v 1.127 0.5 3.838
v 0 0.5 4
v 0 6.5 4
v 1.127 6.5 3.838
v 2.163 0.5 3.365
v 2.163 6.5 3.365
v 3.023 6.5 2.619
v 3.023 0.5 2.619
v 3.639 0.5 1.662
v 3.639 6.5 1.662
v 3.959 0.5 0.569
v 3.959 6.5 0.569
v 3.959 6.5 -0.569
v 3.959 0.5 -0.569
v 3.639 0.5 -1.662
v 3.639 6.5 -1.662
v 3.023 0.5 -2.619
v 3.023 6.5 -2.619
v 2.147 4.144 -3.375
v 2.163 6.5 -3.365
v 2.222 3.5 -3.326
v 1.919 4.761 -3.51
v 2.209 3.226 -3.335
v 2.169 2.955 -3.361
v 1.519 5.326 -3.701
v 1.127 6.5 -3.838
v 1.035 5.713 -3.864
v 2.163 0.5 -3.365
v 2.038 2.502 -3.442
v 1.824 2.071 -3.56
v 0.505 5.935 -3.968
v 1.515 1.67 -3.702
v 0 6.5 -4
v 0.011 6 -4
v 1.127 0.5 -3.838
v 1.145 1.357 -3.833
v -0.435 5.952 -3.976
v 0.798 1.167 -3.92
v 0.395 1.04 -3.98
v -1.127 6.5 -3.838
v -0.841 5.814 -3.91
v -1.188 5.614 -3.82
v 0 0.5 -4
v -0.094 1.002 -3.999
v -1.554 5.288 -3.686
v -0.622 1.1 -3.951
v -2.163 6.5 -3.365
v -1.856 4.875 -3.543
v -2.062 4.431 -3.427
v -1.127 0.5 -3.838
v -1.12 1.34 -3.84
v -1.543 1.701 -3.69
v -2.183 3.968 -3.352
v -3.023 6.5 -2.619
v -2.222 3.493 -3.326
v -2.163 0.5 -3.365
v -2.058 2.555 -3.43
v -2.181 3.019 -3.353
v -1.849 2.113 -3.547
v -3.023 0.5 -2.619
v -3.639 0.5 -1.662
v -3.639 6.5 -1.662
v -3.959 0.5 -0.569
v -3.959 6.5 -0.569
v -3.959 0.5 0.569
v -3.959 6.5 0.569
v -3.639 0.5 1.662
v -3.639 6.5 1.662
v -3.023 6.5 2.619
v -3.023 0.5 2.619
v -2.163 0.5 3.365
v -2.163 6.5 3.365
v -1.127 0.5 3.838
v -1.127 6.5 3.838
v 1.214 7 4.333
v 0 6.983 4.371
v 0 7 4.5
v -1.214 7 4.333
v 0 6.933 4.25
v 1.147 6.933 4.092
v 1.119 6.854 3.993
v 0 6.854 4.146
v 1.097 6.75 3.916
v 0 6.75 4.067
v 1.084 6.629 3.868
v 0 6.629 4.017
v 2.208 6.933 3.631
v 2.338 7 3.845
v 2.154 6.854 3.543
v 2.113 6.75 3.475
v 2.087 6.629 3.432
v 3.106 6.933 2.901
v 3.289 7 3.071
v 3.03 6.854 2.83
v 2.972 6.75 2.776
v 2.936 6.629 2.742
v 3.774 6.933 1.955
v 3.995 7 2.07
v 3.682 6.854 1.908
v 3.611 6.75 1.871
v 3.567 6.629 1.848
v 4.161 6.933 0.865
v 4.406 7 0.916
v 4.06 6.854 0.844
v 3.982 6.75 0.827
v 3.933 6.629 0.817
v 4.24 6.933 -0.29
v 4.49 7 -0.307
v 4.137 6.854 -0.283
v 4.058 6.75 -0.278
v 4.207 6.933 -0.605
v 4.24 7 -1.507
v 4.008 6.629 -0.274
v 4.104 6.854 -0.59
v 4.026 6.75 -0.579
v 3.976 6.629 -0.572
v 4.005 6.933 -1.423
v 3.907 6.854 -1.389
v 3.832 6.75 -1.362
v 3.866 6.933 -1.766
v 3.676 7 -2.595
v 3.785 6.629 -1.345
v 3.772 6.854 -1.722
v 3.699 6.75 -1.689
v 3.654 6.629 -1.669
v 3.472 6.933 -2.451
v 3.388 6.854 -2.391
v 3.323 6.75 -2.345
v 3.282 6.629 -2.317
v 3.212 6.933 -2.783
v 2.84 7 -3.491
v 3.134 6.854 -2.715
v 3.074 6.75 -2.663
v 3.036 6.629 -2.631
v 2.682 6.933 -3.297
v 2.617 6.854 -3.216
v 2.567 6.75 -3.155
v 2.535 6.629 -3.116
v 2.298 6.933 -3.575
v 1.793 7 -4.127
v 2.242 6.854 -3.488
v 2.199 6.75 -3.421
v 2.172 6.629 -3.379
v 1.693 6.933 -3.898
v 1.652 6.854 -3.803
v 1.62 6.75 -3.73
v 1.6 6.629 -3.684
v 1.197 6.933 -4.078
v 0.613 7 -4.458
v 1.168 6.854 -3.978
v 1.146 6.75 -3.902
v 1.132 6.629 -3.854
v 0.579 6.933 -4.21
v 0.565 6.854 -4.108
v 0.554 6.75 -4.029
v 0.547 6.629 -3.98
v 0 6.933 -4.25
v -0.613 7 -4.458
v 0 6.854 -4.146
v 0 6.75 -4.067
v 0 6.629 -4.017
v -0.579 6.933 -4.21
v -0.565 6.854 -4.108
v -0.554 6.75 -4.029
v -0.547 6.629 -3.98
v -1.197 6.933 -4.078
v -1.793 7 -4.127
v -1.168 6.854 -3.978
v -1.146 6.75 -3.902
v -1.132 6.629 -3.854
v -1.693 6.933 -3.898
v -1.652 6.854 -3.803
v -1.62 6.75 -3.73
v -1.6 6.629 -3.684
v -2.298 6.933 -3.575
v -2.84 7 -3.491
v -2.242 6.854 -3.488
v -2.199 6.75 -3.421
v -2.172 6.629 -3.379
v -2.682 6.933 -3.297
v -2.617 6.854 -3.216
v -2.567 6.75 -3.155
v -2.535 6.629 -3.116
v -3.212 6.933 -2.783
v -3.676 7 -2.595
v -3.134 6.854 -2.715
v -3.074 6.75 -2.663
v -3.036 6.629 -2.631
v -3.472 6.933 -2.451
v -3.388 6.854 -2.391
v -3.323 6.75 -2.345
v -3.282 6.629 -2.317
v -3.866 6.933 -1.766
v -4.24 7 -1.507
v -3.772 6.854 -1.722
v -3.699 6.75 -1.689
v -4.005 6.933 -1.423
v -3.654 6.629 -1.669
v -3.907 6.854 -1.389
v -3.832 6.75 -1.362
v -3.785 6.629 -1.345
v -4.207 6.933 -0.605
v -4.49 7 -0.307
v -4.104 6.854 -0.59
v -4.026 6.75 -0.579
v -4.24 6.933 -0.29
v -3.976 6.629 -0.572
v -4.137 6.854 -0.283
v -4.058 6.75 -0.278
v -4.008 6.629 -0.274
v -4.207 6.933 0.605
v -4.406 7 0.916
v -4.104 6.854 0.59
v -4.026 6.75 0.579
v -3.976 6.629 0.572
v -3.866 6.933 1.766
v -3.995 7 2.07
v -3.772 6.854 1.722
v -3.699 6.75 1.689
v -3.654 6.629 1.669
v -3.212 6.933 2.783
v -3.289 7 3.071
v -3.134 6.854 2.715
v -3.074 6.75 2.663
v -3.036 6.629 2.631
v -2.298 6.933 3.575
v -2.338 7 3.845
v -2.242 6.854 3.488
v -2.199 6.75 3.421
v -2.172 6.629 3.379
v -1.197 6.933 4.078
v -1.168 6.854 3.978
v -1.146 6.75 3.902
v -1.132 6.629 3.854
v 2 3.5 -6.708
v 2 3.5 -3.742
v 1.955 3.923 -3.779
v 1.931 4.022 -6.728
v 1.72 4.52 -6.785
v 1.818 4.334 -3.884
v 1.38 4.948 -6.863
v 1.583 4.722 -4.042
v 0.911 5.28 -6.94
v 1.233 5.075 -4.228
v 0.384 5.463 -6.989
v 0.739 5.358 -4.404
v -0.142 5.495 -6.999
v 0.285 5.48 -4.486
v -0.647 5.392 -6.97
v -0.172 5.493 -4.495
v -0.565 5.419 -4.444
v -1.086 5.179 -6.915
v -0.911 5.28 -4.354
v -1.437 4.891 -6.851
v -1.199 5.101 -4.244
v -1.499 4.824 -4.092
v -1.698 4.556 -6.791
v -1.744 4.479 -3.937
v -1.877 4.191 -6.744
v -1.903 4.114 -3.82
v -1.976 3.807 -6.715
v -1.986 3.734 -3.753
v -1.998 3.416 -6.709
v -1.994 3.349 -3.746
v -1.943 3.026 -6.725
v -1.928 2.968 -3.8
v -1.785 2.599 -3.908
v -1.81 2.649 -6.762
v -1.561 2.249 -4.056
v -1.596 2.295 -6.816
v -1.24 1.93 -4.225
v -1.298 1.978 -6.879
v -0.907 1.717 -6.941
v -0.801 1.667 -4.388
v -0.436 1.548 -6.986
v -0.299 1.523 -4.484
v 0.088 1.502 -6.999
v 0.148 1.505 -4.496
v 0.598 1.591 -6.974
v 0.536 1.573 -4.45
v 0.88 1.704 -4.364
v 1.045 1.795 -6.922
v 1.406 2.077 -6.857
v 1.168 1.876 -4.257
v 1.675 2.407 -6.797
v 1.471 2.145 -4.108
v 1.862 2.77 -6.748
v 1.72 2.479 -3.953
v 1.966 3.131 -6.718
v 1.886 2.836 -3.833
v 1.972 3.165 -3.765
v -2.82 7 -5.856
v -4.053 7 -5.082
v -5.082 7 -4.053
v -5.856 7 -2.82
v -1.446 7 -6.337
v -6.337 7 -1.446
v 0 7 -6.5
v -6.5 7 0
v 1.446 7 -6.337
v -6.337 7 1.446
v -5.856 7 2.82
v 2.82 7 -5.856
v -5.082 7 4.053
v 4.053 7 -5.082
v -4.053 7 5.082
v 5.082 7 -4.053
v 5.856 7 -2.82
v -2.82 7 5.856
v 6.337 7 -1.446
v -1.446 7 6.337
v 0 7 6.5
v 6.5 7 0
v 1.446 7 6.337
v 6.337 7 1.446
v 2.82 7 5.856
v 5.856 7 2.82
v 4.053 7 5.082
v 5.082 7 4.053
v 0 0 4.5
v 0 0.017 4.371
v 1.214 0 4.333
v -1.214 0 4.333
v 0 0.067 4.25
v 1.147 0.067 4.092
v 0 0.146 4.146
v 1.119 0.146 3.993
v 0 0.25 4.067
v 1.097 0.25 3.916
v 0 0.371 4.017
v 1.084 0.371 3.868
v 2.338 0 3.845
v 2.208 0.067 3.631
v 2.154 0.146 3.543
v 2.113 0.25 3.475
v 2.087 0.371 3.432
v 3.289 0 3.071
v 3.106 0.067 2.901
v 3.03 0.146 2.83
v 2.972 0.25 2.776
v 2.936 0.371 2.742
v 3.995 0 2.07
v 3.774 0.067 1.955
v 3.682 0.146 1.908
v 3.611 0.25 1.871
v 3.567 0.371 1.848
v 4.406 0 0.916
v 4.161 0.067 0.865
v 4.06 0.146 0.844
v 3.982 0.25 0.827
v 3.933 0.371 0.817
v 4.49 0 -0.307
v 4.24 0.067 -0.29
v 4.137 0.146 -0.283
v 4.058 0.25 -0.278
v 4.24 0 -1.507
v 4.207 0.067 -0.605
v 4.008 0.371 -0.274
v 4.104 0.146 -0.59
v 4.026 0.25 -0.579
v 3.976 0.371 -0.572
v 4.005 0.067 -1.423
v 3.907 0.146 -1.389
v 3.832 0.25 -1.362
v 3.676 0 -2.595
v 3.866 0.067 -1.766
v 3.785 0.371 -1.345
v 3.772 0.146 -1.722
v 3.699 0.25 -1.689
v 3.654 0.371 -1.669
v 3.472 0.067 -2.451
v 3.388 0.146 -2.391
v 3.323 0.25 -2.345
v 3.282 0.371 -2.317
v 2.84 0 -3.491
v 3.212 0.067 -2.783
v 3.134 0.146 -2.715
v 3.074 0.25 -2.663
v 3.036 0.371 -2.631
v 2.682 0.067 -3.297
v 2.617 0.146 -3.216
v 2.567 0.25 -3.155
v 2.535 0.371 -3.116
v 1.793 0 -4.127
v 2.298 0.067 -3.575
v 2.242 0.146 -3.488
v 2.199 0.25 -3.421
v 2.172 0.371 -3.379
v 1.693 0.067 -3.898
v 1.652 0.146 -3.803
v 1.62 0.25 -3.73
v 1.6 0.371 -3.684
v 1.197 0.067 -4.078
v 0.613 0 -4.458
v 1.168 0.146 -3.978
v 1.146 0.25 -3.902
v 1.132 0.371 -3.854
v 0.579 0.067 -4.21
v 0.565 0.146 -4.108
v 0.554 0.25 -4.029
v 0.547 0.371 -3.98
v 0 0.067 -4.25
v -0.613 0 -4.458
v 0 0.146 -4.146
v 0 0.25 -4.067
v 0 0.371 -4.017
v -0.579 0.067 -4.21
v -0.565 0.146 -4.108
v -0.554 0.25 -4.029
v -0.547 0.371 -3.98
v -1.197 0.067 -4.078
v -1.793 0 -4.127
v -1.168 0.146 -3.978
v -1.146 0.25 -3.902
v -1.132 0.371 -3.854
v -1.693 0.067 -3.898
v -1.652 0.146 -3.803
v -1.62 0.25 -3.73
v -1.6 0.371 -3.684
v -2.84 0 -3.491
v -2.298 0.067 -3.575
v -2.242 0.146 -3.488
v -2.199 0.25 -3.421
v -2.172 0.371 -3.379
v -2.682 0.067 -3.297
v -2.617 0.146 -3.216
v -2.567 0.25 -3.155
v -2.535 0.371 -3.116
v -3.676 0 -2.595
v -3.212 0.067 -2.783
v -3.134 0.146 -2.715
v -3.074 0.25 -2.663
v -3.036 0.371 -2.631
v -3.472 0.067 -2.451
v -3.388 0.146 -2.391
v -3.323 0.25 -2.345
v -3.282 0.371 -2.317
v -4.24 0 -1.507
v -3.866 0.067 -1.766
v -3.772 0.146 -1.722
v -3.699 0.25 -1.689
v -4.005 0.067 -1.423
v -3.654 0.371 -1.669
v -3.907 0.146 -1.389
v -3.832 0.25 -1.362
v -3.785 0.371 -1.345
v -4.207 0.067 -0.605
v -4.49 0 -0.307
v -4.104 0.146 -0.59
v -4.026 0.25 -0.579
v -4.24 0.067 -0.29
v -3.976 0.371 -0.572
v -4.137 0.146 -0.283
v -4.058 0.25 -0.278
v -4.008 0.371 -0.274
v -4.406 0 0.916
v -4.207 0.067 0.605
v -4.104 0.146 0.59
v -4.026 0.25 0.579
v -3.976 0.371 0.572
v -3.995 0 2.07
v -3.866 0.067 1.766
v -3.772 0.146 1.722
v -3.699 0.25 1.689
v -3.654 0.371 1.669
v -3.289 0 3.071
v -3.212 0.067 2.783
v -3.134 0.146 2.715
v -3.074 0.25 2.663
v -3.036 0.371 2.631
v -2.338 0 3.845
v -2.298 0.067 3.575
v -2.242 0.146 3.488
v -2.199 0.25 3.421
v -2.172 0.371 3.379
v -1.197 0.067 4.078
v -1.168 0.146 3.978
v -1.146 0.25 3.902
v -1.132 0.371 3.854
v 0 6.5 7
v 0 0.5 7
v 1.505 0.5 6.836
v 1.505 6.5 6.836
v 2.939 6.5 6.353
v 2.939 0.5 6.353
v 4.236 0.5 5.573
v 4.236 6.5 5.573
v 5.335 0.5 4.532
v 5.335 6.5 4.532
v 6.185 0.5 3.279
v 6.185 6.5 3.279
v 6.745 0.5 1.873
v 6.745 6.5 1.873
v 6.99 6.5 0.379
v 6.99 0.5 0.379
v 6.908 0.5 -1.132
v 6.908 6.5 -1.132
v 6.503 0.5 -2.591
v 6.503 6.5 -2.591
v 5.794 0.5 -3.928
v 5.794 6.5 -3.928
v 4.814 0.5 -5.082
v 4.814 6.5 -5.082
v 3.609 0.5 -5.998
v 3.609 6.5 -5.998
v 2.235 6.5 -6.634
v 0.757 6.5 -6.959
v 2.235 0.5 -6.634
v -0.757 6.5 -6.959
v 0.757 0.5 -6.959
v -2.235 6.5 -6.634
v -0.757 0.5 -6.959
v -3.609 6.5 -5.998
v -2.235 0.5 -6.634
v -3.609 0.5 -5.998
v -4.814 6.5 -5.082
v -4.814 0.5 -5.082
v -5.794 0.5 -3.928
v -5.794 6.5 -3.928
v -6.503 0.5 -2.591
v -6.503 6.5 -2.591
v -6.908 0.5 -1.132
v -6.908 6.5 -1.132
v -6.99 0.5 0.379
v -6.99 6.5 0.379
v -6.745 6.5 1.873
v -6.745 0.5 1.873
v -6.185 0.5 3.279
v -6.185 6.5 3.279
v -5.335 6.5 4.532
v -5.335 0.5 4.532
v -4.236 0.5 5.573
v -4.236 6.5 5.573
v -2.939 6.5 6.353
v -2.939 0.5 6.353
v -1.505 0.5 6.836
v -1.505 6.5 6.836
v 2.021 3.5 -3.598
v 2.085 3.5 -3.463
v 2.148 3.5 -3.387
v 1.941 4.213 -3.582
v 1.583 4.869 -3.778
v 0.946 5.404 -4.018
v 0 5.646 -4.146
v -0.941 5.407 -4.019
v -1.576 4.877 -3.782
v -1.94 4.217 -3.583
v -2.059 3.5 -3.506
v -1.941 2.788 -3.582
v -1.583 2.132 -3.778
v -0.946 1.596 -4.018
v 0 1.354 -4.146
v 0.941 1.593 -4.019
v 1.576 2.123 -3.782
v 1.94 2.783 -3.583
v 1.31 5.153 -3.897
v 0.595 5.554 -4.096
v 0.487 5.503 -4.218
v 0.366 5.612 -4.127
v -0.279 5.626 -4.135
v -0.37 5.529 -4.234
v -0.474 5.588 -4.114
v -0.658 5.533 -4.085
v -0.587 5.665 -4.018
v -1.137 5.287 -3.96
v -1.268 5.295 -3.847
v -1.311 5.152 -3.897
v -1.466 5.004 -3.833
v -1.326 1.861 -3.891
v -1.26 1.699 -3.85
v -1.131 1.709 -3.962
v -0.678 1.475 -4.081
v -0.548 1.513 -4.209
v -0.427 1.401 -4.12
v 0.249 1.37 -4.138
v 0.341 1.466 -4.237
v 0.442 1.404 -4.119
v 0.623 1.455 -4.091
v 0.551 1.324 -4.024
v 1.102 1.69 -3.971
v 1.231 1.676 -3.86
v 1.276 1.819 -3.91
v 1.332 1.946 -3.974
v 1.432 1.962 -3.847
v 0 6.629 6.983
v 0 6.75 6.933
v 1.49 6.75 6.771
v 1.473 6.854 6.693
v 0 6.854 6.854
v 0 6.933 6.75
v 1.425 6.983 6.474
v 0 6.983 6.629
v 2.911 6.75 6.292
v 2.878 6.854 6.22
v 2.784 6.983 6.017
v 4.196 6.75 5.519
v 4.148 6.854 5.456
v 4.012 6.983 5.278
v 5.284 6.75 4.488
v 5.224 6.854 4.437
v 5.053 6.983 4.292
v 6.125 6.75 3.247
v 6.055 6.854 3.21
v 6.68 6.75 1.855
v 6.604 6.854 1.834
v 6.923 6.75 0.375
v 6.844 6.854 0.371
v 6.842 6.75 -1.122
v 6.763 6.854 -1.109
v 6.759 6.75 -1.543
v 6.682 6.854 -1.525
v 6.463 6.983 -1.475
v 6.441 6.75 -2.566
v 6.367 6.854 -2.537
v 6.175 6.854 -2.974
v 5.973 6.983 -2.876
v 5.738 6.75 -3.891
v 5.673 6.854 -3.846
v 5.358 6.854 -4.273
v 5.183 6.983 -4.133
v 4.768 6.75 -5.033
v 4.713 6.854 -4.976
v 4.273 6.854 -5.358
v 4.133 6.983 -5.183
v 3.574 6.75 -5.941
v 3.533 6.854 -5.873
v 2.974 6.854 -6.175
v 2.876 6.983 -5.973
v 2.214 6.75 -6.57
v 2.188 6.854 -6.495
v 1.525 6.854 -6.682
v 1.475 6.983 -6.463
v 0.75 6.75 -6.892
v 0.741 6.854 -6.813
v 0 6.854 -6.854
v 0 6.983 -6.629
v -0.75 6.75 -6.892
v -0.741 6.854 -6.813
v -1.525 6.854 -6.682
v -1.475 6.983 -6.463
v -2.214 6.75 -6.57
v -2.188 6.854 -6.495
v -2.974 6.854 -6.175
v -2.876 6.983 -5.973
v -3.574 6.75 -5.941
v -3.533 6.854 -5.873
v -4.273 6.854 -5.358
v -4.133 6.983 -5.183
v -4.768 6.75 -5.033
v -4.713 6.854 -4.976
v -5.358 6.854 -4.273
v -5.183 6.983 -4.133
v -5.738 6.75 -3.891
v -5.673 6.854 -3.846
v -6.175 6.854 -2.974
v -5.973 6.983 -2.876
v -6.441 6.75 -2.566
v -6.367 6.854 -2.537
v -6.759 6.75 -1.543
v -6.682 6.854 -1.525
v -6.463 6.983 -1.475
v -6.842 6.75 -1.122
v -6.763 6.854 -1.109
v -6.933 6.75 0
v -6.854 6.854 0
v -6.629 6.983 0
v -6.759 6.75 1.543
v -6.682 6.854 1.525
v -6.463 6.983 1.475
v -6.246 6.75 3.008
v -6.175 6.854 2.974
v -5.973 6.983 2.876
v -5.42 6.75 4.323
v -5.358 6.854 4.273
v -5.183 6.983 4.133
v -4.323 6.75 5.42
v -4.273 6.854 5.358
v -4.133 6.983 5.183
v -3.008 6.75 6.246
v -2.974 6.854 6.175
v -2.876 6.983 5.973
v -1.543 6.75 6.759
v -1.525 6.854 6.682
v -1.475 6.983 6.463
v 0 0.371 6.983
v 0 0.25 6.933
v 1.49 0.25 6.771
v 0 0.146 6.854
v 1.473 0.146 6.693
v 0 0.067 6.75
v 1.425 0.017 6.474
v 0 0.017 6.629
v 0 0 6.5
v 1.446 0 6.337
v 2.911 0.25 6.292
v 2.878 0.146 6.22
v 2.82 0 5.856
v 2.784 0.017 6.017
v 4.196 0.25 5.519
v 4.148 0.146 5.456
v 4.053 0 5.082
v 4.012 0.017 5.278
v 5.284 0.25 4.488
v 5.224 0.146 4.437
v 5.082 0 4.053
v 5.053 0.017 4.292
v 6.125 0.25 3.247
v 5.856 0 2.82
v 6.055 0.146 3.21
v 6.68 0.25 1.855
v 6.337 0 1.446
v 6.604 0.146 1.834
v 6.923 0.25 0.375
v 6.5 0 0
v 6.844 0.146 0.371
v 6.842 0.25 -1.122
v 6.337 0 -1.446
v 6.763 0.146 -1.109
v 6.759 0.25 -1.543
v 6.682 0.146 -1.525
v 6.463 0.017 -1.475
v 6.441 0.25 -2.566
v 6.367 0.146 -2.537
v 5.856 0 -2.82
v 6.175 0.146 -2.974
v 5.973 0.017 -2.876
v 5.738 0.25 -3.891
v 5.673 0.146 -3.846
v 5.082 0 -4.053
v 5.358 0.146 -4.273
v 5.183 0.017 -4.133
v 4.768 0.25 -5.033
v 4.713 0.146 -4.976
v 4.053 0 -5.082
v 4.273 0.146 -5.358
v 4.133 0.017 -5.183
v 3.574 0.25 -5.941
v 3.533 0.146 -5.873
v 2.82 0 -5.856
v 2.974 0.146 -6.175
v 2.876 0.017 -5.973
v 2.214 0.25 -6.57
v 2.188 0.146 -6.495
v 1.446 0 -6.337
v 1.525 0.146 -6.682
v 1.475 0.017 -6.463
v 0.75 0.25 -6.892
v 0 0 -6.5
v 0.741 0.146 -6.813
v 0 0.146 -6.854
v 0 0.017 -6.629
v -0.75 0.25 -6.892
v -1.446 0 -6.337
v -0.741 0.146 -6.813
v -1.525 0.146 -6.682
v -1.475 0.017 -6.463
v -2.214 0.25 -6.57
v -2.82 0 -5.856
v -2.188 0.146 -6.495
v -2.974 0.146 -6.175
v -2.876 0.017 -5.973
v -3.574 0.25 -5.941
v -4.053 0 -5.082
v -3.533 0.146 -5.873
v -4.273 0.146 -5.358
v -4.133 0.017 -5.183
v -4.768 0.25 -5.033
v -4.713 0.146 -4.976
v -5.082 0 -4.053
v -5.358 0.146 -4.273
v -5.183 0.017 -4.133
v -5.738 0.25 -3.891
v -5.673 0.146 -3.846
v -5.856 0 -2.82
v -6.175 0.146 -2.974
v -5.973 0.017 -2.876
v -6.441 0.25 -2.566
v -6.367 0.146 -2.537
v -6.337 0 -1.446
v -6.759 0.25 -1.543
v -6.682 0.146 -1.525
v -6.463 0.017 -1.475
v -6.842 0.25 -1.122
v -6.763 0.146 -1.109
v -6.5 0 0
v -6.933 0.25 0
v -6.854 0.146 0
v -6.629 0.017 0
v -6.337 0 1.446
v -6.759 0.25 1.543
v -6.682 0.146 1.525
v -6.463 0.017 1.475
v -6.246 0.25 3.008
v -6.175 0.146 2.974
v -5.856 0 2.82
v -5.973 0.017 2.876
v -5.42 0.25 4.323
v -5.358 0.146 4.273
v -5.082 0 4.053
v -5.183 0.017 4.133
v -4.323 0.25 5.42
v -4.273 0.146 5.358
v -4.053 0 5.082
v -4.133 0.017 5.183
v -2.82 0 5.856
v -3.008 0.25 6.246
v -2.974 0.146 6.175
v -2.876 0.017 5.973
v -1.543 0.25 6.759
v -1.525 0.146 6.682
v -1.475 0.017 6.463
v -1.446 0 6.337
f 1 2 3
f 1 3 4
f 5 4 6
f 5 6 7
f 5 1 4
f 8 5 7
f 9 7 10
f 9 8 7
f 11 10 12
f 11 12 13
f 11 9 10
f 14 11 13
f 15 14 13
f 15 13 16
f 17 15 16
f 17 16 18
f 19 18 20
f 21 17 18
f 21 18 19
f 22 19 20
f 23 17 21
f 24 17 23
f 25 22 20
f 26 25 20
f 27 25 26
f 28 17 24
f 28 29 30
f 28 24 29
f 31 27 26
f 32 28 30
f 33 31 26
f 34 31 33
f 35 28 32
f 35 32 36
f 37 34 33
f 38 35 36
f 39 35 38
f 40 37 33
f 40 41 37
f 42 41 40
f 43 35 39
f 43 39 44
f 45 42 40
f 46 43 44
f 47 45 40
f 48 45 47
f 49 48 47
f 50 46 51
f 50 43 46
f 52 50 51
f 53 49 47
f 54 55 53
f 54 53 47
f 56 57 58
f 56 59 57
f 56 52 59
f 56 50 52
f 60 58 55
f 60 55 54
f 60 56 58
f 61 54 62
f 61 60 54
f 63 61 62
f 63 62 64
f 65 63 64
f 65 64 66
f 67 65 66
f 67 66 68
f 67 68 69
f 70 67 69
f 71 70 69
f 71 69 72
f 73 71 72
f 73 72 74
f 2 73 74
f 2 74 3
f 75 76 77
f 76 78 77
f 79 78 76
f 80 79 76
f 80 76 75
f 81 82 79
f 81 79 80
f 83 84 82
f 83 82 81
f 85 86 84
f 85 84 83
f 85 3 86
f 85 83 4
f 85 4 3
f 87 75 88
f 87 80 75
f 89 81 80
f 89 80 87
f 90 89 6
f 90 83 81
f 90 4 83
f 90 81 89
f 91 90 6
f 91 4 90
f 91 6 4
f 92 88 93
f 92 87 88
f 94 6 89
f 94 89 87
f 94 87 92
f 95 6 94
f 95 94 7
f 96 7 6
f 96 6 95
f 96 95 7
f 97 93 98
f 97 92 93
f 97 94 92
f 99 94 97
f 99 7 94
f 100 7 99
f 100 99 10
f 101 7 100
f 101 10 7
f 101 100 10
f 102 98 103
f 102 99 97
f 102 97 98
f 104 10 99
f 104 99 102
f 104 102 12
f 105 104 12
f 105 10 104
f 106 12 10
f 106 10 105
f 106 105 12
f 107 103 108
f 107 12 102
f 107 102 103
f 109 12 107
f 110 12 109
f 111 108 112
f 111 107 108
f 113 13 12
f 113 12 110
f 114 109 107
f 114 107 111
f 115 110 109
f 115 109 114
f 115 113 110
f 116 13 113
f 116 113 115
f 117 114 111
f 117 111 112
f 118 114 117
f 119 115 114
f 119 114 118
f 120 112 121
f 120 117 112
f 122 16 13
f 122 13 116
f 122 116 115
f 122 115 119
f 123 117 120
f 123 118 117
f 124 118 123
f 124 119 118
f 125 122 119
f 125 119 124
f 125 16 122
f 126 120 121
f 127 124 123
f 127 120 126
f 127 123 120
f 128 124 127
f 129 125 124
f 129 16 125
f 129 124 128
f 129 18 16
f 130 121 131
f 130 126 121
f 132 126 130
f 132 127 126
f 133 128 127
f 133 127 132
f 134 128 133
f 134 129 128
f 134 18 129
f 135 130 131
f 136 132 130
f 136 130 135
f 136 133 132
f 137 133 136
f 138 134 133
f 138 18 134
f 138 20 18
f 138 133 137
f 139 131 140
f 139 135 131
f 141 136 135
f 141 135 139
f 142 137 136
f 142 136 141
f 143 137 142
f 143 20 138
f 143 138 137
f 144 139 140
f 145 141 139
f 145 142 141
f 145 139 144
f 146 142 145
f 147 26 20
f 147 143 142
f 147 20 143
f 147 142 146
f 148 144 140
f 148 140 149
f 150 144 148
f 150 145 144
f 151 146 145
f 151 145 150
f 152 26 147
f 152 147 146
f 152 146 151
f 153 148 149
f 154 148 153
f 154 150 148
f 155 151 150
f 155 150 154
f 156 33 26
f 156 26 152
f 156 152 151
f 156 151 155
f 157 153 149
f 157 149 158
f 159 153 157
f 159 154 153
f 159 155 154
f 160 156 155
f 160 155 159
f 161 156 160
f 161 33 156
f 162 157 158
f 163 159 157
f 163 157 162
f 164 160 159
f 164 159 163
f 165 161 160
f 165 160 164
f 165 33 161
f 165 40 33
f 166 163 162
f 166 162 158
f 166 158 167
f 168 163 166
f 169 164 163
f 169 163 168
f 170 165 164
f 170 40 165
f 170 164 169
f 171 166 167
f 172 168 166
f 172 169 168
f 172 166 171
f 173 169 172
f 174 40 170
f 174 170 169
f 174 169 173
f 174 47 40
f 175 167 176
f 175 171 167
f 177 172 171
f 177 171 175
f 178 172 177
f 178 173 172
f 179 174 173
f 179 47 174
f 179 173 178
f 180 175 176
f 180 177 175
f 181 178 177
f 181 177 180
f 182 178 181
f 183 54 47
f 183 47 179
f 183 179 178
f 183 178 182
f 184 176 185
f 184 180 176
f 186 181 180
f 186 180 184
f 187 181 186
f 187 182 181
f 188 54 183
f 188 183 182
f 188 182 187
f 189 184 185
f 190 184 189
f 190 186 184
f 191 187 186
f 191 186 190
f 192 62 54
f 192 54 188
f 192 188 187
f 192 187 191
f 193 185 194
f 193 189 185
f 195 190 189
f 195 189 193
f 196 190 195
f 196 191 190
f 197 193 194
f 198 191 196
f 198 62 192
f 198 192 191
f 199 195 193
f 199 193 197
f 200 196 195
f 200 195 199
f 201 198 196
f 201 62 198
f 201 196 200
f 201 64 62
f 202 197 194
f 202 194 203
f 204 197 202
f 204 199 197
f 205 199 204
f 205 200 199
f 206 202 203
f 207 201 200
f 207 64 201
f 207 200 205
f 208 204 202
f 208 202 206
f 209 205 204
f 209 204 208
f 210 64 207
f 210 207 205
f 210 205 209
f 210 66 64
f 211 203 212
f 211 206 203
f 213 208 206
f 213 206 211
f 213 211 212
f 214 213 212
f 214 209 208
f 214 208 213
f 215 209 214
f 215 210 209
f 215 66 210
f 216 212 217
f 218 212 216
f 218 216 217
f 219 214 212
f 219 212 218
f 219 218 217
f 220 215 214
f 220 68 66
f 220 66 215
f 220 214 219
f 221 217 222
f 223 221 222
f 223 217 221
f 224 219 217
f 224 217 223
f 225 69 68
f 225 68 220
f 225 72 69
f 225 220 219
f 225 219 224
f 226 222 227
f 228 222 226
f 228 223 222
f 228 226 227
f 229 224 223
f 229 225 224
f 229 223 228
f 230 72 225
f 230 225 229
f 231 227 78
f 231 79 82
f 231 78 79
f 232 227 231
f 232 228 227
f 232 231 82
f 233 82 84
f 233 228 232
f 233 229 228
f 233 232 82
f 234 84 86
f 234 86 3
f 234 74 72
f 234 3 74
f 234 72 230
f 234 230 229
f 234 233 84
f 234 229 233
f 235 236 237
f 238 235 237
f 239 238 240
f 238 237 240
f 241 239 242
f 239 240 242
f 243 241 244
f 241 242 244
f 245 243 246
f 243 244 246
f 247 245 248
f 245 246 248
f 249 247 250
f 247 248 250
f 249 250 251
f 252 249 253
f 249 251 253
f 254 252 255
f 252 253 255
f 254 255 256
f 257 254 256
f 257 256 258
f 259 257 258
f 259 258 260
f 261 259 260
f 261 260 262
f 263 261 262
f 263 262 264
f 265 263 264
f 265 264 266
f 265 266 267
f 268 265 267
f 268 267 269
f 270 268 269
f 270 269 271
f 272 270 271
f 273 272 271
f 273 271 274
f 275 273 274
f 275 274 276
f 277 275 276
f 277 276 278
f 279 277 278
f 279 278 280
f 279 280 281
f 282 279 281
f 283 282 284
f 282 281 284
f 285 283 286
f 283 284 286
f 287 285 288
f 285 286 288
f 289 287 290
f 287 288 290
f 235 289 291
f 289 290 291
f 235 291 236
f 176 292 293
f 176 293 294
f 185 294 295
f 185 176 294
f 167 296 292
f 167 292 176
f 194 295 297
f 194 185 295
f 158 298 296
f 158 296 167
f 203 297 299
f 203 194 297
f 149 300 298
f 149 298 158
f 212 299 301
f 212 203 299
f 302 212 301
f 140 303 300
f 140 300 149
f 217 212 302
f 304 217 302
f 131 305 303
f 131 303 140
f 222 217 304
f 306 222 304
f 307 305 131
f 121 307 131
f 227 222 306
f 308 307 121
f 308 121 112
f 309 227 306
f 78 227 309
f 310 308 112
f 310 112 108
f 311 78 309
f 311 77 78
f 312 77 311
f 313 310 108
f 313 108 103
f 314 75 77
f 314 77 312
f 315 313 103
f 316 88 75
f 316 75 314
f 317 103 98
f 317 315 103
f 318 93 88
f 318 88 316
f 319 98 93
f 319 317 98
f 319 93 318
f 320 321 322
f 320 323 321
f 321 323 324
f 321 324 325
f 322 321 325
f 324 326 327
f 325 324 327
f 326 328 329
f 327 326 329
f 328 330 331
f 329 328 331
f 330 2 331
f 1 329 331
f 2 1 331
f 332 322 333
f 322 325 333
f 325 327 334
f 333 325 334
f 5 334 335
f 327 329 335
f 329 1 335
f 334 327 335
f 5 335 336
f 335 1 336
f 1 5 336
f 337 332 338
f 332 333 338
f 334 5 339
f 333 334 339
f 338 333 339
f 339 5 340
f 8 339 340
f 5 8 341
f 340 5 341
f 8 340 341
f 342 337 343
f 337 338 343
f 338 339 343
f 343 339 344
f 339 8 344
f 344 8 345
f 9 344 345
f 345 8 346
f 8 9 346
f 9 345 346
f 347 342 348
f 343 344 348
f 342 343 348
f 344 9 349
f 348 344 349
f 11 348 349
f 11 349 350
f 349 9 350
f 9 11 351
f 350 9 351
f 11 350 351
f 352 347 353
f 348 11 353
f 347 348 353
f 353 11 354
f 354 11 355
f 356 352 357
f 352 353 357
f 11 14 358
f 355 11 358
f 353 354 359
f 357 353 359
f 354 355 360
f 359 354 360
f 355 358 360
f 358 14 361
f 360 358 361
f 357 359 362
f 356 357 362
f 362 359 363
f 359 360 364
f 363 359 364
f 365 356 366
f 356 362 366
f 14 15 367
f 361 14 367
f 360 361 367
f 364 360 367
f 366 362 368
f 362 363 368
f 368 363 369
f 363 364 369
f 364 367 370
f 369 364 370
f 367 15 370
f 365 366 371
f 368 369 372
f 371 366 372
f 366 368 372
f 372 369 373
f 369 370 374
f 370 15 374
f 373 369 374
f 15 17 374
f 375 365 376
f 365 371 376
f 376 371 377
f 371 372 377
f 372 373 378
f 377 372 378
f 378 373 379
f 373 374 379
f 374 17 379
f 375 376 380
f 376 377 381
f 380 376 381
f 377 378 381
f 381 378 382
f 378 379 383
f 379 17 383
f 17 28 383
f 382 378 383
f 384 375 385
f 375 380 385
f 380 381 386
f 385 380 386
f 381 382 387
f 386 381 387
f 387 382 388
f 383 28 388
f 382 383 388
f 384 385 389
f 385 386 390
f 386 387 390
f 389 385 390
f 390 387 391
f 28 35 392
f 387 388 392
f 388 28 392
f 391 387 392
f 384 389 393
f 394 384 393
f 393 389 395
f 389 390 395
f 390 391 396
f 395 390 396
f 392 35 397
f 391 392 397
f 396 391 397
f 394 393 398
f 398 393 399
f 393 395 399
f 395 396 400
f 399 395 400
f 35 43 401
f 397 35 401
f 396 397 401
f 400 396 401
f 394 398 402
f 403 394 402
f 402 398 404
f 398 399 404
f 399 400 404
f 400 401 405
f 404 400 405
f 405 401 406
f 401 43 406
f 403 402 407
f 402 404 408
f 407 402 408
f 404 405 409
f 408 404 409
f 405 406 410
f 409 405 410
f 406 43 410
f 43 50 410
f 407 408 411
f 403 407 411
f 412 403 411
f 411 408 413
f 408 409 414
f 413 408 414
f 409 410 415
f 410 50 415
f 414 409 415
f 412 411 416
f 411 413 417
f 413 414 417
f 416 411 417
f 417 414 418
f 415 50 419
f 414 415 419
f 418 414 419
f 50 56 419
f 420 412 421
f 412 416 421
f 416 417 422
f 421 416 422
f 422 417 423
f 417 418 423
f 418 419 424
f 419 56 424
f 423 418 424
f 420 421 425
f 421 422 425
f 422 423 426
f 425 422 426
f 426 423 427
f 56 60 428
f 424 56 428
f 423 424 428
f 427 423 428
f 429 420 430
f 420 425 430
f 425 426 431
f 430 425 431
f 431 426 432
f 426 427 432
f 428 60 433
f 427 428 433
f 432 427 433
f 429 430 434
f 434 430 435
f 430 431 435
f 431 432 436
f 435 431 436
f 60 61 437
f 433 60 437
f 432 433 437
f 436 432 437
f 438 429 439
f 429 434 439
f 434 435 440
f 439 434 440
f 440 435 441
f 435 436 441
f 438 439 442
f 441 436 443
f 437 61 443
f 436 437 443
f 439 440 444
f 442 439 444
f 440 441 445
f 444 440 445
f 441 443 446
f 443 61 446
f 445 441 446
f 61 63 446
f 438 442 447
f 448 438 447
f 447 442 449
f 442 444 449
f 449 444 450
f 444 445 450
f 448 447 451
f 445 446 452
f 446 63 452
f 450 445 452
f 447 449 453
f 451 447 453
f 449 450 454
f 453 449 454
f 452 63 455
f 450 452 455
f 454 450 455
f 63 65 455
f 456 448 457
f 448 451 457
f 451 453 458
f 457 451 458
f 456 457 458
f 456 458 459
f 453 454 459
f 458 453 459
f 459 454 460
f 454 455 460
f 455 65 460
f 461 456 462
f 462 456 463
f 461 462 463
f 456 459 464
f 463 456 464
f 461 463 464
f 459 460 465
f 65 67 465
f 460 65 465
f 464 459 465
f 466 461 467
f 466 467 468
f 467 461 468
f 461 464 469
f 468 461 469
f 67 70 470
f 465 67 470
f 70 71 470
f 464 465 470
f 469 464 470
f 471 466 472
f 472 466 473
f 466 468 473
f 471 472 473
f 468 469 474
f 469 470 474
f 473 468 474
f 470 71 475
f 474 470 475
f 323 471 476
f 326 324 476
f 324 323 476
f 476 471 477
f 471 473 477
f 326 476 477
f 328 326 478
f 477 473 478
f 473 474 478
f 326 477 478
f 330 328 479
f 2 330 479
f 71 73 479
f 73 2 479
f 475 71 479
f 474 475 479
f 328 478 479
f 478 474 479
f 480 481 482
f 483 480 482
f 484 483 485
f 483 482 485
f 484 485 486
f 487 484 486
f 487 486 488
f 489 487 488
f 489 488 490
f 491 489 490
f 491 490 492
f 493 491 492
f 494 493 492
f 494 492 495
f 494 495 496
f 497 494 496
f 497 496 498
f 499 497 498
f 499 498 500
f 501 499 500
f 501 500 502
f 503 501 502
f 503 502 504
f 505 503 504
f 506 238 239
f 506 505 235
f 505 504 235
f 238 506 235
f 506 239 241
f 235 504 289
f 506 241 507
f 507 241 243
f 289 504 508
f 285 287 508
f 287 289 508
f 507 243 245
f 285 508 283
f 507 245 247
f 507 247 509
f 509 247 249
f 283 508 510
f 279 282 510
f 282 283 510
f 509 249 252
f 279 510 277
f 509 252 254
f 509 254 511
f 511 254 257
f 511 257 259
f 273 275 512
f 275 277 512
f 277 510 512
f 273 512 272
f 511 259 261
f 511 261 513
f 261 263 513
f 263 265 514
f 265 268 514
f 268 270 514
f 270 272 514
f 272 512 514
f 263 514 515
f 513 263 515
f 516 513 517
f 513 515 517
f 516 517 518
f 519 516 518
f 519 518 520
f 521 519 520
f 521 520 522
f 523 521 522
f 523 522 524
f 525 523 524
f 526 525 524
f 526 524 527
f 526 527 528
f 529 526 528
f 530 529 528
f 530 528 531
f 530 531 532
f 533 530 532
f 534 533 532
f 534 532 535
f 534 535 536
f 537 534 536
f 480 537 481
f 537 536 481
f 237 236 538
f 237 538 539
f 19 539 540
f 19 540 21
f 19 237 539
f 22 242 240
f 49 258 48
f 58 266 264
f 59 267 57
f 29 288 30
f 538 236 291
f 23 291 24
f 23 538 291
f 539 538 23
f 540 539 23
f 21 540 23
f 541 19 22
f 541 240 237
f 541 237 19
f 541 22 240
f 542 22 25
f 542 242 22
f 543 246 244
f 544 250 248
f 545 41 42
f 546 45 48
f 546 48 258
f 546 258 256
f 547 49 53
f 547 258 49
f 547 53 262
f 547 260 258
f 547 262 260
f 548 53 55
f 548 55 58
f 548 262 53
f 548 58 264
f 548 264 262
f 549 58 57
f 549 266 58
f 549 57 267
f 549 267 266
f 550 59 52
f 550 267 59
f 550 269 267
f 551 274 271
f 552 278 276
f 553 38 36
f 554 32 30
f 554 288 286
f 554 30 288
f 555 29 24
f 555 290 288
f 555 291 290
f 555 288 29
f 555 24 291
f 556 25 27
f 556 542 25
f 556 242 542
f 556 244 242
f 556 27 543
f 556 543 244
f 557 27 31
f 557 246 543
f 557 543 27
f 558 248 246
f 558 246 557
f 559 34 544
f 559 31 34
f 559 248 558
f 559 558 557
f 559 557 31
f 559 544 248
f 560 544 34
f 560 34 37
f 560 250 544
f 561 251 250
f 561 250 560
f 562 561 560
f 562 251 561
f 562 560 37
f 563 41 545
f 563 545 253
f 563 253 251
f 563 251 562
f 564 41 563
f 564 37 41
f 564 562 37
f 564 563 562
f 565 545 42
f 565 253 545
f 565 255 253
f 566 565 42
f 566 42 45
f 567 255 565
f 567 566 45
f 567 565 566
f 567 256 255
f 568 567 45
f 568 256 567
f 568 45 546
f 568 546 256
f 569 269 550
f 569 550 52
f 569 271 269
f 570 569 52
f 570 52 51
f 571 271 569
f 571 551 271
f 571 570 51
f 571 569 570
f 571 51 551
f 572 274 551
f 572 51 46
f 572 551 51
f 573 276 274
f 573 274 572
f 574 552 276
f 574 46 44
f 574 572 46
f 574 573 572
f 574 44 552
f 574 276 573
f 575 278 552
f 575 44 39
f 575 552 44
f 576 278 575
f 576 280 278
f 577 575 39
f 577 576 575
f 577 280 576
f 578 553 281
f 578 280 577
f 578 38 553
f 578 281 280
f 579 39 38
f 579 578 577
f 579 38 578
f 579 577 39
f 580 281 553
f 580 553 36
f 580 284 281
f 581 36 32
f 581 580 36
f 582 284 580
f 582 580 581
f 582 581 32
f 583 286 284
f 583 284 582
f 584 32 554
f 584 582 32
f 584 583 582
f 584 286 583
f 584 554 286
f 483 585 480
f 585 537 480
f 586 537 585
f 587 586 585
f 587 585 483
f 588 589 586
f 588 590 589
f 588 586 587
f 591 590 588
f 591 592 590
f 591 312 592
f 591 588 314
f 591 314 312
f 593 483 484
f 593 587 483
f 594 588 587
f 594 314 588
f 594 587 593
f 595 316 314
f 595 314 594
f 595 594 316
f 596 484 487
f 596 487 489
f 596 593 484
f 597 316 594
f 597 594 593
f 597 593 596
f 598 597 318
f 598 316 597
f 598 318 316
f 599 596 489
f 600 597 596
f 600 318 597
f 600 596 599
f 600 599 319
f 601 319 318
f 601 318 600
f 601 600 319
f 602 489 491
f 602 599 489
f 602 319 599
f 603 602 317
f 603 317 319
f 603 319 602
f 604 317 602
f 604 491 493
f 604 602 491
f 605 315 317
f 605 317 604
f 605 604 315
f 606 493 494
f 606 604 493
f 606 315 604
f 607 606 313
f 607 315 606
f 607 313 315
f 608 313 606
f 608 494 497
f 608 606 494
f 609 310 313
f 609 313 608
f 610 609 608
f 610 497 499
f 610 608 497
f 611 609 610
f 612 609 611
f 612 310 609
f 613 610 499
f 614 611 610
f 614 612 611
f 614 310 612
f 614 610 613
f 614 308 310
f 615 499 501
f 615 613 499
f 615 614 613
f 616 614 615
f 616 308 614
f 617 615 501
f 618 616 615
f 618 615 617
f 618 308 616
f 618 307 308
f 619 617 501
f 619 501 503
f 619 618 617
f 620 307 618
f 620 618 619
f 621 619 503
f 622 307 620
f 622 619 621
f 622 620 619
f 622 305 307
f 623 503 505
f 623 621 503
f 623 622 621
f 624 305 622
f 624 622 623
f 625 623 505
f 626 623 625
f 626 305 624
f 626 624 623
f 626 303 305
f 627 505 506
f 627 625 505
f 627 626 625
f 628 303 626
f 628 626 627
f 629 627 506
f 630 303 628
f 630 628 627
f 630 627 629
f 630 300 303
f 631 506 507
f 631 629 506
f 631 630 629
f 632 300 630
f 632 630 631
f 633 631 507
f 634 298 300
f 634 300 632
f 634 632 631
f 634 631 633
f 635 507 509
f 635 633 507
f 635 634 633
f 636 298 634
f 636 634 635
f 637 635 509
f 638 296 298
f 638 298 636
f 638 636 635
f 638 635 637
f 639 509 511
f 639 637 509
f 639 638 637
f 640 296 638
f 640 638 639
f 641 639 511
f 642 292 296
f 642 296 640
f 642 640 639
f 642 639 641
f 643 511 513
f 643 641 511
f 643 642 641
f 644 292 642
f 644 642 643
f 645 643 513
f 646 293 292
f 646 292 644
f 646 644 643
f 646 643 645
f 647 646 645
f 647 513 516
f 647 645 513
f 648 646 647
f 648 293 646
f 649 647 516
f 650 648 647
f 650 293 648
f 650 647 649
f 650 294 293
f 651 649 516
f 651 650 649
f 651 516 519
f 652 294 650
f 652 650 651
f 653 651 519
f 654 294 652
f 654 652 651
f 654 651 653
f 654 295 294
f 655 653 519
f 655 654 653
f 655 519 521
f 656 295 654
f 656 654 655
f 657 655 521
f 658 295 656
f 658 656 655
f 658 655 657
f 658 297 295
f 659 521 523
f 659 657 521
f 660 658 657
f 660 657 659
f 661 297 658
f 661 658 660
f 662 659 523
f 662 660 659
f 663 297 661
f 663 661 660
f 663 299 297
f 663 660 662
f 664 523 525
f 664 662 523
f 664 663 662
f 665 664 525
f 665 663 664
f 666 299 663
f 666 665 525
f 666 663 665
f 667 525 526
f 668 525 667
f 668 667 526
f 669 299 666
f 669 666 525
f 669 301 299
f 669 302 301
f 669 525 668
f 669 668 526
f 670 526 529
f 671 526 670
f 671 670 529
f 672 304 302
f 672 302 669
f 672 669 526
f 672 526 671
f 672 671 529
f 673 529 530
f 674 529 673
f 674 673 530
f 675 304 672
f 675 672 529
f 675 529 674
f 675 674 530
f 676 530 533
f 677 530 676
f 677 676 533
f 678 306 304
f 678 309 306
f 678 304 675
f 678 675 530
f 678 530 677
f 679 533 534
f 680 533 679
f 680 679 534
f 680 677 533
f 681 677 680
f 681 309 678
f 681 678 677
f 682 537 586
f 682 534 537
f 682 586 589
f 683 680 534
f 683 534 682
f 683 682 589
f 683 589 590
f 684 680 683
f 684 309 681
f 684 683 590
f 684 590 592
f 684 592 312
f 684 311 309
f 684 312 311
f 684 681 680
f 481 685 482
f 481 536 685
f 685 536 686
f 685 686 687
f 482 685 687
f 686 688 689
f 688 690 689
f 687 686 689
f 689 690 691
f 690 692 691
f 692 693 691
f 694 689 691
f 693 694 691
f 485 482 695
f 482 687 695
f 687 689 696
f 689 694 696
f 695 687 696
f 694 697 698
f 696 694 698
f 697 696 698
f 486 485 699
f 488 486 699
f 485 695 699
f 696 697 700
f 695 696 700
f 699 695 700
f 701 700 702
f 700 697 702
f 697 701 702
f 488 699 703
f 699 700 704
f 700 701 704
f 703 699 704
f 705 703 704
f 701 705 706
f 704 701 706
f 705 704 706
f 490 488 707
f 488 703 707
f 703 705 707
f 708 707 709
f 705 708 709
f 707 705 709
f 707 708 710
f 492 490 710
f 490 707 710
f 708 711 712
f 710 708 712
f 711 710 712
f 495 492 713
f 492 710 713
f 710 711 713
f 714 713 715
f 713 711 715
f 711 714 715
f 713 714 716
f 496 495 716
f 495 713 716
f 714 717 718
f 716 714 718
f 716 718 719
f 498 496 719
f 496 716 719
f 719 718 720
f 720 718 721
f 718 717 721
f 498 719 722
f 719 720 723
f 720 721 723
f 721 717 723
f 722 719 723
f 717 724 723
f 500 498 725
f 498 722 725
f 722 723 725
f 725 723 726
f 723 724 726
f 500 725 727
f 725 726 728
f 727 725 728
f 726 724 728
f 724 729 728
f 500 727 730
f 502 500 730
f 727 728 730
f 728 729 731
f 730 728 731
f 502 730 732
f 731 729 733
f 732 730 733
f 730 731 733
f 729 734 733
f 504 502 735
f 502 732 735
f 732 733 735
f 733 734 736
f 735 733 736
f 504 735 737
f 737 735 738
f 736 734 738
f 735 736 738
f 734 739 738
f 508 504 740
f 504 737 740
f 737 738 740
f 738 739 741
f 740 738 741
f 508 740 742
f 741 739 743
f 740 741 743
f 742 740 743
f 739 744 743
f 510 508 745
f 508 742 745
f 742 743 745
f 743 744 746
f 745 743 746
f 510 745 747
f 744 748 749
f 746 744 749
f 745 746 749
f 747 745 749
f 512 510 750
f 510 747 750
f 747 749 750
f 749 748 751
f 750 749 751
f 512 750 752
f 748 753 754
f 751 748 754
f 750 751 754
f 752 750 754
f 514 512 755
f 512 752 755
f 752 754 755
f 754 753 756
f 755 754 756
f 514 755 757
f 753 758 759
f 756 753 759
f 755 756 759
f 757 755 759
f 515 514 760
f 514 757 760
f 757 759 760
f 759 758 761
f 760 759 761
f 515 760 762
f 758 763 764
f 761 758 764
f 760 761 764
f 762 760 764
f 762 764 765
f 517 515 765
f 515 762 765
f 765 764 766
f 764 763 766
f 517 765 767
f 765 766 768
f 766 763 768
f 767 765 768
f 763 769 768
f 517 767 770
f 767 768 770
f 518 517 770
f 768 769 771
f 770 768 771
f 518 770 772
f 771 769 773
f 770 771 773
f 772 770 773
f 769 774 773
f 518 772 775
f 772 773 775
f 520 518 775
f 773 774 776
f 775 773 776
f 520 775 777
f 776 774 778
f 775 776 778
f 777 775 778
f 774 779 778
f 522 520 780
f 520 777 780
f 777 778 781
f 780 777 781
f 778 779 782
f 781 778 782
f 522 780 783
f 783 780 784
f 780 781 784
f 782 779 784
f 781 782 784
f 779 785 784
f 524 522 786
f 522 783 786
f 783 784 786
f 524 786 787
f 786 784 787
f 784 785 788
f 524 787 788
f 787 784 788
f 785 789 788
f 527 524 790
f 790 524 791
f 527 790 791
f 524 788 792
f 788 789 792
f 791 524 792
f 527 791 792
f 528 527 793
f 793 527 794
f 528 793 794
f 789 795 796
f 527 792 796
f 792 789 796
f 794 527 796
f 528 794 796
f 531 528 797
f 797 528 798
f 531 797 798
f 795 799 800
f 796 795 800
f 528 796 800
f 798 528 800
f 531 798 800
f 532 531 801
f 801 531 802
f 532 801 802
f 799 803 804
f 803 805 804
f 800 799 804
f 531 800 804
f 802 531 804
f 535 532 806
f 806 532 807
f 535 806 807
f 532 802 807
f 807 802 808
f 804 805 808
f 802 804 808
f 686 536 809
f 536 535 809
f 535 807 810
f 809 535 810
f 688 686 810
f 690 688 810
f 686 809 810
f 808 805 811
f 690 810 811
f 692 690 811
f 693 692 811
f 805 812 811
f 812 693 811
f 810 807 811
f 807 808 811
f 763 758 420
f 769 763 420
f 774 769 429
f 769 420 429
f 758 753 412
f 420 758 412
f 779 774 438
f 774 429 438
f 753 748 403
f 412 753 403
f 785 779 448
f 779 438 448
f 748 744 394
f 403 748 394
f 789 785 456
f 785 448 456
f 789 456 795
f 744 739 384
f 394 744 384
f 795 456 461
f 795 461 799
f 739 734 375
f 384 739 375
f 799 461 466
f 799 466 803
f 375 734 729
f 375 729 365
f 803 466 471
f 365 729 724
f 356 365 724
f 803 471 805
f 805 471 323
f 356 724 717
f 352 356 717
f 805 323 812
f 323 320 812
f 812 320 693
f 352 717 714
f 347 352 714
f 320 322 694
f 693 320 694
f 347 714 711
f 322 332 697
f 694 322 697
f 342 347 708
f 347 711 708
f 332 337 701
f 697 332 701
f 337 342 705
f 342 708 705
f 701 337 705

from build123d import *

# Parameters (mm, degrees)
SKETCH1_R               = 7
SKETCH1_R_2             = 4
BOSS_EXTRUDE1_DEPTH     = 7
CUT_EXTRUDE1_REACH      = 14.124
CUT_EXTRUDE1_END_RADIUS = 7
SKETCH2_R               = 2
FILLET1_R               = 0.5
FILLET2_R               = 0.5


with BuildPart() as part:
    # Sketch1 → Boss-Extrude1 (new body)
    with BuildSketch(Plane(origin=(0, 0, 0), x_dir=(1, 0, 0), z_dir=(0, 1, 0))):
        with Locations(Location((0, 0, 0), (0, 0, 270))):
            Circle(SKETCH1_R)
        with Locations(Location((0, 0, 0), (0, 0, 270))):
            Circle(SKETCH1_R_2, mode=Mode.SUBTRACT)
    extrude(amount=BOSS_EXTRUDE1_DEPTH)

    # Cut-Extrude1: up to this cylinder (the profile starts inside it)
    cut_extrude1_end = Plane(origin=(0, 3.5, 0), z_dir=(0, -1, 0)) * Cylinder(CUT_EXTRUDE1_END_RADIUS, 43.248, mode=Mode.PRIVATE)
    # Sketch2 → Cut-Extrude1 (cut, up to the surface)
    with BuildSketch(Plane.XY, mode=Mode.PRIVATE) as cut_extrude1_sk1:
        with Locations((0, 3.5)):
            Circle(SKETCH2_R)
    cut_extrude1_tool1 = extrude(cut_extrude1_sk1.sketch, amount=-CUT_EXTRUDE1_REACH, mode=Mode.PRIVATE) & cut_extrude1_end
    add(cut_extrude1_tool1.solids().sort_by_distance((0, 3.5, 0))[0], mode=Mode.SUBTRACT)

    # Fillet1
    fillet1_edges = [part.edges().sort_by_distance(p)[0] for p in [
        (0, 0, -7),
        (0, 7, -7),
    ]]
    fillet(fillet1_edges, radius=FILLET1_R)

    # Fillet2
    fillet2_edges = [part.edges().sort_by_distance(p)[0] for p in [
        (-2, 3.5, -3.464101615),
        (0, 0, -4),
        (0, 7, -4),
    ]]
    fillet(fillet2_edges, radius=FILLET2_R)


solid = part.part
